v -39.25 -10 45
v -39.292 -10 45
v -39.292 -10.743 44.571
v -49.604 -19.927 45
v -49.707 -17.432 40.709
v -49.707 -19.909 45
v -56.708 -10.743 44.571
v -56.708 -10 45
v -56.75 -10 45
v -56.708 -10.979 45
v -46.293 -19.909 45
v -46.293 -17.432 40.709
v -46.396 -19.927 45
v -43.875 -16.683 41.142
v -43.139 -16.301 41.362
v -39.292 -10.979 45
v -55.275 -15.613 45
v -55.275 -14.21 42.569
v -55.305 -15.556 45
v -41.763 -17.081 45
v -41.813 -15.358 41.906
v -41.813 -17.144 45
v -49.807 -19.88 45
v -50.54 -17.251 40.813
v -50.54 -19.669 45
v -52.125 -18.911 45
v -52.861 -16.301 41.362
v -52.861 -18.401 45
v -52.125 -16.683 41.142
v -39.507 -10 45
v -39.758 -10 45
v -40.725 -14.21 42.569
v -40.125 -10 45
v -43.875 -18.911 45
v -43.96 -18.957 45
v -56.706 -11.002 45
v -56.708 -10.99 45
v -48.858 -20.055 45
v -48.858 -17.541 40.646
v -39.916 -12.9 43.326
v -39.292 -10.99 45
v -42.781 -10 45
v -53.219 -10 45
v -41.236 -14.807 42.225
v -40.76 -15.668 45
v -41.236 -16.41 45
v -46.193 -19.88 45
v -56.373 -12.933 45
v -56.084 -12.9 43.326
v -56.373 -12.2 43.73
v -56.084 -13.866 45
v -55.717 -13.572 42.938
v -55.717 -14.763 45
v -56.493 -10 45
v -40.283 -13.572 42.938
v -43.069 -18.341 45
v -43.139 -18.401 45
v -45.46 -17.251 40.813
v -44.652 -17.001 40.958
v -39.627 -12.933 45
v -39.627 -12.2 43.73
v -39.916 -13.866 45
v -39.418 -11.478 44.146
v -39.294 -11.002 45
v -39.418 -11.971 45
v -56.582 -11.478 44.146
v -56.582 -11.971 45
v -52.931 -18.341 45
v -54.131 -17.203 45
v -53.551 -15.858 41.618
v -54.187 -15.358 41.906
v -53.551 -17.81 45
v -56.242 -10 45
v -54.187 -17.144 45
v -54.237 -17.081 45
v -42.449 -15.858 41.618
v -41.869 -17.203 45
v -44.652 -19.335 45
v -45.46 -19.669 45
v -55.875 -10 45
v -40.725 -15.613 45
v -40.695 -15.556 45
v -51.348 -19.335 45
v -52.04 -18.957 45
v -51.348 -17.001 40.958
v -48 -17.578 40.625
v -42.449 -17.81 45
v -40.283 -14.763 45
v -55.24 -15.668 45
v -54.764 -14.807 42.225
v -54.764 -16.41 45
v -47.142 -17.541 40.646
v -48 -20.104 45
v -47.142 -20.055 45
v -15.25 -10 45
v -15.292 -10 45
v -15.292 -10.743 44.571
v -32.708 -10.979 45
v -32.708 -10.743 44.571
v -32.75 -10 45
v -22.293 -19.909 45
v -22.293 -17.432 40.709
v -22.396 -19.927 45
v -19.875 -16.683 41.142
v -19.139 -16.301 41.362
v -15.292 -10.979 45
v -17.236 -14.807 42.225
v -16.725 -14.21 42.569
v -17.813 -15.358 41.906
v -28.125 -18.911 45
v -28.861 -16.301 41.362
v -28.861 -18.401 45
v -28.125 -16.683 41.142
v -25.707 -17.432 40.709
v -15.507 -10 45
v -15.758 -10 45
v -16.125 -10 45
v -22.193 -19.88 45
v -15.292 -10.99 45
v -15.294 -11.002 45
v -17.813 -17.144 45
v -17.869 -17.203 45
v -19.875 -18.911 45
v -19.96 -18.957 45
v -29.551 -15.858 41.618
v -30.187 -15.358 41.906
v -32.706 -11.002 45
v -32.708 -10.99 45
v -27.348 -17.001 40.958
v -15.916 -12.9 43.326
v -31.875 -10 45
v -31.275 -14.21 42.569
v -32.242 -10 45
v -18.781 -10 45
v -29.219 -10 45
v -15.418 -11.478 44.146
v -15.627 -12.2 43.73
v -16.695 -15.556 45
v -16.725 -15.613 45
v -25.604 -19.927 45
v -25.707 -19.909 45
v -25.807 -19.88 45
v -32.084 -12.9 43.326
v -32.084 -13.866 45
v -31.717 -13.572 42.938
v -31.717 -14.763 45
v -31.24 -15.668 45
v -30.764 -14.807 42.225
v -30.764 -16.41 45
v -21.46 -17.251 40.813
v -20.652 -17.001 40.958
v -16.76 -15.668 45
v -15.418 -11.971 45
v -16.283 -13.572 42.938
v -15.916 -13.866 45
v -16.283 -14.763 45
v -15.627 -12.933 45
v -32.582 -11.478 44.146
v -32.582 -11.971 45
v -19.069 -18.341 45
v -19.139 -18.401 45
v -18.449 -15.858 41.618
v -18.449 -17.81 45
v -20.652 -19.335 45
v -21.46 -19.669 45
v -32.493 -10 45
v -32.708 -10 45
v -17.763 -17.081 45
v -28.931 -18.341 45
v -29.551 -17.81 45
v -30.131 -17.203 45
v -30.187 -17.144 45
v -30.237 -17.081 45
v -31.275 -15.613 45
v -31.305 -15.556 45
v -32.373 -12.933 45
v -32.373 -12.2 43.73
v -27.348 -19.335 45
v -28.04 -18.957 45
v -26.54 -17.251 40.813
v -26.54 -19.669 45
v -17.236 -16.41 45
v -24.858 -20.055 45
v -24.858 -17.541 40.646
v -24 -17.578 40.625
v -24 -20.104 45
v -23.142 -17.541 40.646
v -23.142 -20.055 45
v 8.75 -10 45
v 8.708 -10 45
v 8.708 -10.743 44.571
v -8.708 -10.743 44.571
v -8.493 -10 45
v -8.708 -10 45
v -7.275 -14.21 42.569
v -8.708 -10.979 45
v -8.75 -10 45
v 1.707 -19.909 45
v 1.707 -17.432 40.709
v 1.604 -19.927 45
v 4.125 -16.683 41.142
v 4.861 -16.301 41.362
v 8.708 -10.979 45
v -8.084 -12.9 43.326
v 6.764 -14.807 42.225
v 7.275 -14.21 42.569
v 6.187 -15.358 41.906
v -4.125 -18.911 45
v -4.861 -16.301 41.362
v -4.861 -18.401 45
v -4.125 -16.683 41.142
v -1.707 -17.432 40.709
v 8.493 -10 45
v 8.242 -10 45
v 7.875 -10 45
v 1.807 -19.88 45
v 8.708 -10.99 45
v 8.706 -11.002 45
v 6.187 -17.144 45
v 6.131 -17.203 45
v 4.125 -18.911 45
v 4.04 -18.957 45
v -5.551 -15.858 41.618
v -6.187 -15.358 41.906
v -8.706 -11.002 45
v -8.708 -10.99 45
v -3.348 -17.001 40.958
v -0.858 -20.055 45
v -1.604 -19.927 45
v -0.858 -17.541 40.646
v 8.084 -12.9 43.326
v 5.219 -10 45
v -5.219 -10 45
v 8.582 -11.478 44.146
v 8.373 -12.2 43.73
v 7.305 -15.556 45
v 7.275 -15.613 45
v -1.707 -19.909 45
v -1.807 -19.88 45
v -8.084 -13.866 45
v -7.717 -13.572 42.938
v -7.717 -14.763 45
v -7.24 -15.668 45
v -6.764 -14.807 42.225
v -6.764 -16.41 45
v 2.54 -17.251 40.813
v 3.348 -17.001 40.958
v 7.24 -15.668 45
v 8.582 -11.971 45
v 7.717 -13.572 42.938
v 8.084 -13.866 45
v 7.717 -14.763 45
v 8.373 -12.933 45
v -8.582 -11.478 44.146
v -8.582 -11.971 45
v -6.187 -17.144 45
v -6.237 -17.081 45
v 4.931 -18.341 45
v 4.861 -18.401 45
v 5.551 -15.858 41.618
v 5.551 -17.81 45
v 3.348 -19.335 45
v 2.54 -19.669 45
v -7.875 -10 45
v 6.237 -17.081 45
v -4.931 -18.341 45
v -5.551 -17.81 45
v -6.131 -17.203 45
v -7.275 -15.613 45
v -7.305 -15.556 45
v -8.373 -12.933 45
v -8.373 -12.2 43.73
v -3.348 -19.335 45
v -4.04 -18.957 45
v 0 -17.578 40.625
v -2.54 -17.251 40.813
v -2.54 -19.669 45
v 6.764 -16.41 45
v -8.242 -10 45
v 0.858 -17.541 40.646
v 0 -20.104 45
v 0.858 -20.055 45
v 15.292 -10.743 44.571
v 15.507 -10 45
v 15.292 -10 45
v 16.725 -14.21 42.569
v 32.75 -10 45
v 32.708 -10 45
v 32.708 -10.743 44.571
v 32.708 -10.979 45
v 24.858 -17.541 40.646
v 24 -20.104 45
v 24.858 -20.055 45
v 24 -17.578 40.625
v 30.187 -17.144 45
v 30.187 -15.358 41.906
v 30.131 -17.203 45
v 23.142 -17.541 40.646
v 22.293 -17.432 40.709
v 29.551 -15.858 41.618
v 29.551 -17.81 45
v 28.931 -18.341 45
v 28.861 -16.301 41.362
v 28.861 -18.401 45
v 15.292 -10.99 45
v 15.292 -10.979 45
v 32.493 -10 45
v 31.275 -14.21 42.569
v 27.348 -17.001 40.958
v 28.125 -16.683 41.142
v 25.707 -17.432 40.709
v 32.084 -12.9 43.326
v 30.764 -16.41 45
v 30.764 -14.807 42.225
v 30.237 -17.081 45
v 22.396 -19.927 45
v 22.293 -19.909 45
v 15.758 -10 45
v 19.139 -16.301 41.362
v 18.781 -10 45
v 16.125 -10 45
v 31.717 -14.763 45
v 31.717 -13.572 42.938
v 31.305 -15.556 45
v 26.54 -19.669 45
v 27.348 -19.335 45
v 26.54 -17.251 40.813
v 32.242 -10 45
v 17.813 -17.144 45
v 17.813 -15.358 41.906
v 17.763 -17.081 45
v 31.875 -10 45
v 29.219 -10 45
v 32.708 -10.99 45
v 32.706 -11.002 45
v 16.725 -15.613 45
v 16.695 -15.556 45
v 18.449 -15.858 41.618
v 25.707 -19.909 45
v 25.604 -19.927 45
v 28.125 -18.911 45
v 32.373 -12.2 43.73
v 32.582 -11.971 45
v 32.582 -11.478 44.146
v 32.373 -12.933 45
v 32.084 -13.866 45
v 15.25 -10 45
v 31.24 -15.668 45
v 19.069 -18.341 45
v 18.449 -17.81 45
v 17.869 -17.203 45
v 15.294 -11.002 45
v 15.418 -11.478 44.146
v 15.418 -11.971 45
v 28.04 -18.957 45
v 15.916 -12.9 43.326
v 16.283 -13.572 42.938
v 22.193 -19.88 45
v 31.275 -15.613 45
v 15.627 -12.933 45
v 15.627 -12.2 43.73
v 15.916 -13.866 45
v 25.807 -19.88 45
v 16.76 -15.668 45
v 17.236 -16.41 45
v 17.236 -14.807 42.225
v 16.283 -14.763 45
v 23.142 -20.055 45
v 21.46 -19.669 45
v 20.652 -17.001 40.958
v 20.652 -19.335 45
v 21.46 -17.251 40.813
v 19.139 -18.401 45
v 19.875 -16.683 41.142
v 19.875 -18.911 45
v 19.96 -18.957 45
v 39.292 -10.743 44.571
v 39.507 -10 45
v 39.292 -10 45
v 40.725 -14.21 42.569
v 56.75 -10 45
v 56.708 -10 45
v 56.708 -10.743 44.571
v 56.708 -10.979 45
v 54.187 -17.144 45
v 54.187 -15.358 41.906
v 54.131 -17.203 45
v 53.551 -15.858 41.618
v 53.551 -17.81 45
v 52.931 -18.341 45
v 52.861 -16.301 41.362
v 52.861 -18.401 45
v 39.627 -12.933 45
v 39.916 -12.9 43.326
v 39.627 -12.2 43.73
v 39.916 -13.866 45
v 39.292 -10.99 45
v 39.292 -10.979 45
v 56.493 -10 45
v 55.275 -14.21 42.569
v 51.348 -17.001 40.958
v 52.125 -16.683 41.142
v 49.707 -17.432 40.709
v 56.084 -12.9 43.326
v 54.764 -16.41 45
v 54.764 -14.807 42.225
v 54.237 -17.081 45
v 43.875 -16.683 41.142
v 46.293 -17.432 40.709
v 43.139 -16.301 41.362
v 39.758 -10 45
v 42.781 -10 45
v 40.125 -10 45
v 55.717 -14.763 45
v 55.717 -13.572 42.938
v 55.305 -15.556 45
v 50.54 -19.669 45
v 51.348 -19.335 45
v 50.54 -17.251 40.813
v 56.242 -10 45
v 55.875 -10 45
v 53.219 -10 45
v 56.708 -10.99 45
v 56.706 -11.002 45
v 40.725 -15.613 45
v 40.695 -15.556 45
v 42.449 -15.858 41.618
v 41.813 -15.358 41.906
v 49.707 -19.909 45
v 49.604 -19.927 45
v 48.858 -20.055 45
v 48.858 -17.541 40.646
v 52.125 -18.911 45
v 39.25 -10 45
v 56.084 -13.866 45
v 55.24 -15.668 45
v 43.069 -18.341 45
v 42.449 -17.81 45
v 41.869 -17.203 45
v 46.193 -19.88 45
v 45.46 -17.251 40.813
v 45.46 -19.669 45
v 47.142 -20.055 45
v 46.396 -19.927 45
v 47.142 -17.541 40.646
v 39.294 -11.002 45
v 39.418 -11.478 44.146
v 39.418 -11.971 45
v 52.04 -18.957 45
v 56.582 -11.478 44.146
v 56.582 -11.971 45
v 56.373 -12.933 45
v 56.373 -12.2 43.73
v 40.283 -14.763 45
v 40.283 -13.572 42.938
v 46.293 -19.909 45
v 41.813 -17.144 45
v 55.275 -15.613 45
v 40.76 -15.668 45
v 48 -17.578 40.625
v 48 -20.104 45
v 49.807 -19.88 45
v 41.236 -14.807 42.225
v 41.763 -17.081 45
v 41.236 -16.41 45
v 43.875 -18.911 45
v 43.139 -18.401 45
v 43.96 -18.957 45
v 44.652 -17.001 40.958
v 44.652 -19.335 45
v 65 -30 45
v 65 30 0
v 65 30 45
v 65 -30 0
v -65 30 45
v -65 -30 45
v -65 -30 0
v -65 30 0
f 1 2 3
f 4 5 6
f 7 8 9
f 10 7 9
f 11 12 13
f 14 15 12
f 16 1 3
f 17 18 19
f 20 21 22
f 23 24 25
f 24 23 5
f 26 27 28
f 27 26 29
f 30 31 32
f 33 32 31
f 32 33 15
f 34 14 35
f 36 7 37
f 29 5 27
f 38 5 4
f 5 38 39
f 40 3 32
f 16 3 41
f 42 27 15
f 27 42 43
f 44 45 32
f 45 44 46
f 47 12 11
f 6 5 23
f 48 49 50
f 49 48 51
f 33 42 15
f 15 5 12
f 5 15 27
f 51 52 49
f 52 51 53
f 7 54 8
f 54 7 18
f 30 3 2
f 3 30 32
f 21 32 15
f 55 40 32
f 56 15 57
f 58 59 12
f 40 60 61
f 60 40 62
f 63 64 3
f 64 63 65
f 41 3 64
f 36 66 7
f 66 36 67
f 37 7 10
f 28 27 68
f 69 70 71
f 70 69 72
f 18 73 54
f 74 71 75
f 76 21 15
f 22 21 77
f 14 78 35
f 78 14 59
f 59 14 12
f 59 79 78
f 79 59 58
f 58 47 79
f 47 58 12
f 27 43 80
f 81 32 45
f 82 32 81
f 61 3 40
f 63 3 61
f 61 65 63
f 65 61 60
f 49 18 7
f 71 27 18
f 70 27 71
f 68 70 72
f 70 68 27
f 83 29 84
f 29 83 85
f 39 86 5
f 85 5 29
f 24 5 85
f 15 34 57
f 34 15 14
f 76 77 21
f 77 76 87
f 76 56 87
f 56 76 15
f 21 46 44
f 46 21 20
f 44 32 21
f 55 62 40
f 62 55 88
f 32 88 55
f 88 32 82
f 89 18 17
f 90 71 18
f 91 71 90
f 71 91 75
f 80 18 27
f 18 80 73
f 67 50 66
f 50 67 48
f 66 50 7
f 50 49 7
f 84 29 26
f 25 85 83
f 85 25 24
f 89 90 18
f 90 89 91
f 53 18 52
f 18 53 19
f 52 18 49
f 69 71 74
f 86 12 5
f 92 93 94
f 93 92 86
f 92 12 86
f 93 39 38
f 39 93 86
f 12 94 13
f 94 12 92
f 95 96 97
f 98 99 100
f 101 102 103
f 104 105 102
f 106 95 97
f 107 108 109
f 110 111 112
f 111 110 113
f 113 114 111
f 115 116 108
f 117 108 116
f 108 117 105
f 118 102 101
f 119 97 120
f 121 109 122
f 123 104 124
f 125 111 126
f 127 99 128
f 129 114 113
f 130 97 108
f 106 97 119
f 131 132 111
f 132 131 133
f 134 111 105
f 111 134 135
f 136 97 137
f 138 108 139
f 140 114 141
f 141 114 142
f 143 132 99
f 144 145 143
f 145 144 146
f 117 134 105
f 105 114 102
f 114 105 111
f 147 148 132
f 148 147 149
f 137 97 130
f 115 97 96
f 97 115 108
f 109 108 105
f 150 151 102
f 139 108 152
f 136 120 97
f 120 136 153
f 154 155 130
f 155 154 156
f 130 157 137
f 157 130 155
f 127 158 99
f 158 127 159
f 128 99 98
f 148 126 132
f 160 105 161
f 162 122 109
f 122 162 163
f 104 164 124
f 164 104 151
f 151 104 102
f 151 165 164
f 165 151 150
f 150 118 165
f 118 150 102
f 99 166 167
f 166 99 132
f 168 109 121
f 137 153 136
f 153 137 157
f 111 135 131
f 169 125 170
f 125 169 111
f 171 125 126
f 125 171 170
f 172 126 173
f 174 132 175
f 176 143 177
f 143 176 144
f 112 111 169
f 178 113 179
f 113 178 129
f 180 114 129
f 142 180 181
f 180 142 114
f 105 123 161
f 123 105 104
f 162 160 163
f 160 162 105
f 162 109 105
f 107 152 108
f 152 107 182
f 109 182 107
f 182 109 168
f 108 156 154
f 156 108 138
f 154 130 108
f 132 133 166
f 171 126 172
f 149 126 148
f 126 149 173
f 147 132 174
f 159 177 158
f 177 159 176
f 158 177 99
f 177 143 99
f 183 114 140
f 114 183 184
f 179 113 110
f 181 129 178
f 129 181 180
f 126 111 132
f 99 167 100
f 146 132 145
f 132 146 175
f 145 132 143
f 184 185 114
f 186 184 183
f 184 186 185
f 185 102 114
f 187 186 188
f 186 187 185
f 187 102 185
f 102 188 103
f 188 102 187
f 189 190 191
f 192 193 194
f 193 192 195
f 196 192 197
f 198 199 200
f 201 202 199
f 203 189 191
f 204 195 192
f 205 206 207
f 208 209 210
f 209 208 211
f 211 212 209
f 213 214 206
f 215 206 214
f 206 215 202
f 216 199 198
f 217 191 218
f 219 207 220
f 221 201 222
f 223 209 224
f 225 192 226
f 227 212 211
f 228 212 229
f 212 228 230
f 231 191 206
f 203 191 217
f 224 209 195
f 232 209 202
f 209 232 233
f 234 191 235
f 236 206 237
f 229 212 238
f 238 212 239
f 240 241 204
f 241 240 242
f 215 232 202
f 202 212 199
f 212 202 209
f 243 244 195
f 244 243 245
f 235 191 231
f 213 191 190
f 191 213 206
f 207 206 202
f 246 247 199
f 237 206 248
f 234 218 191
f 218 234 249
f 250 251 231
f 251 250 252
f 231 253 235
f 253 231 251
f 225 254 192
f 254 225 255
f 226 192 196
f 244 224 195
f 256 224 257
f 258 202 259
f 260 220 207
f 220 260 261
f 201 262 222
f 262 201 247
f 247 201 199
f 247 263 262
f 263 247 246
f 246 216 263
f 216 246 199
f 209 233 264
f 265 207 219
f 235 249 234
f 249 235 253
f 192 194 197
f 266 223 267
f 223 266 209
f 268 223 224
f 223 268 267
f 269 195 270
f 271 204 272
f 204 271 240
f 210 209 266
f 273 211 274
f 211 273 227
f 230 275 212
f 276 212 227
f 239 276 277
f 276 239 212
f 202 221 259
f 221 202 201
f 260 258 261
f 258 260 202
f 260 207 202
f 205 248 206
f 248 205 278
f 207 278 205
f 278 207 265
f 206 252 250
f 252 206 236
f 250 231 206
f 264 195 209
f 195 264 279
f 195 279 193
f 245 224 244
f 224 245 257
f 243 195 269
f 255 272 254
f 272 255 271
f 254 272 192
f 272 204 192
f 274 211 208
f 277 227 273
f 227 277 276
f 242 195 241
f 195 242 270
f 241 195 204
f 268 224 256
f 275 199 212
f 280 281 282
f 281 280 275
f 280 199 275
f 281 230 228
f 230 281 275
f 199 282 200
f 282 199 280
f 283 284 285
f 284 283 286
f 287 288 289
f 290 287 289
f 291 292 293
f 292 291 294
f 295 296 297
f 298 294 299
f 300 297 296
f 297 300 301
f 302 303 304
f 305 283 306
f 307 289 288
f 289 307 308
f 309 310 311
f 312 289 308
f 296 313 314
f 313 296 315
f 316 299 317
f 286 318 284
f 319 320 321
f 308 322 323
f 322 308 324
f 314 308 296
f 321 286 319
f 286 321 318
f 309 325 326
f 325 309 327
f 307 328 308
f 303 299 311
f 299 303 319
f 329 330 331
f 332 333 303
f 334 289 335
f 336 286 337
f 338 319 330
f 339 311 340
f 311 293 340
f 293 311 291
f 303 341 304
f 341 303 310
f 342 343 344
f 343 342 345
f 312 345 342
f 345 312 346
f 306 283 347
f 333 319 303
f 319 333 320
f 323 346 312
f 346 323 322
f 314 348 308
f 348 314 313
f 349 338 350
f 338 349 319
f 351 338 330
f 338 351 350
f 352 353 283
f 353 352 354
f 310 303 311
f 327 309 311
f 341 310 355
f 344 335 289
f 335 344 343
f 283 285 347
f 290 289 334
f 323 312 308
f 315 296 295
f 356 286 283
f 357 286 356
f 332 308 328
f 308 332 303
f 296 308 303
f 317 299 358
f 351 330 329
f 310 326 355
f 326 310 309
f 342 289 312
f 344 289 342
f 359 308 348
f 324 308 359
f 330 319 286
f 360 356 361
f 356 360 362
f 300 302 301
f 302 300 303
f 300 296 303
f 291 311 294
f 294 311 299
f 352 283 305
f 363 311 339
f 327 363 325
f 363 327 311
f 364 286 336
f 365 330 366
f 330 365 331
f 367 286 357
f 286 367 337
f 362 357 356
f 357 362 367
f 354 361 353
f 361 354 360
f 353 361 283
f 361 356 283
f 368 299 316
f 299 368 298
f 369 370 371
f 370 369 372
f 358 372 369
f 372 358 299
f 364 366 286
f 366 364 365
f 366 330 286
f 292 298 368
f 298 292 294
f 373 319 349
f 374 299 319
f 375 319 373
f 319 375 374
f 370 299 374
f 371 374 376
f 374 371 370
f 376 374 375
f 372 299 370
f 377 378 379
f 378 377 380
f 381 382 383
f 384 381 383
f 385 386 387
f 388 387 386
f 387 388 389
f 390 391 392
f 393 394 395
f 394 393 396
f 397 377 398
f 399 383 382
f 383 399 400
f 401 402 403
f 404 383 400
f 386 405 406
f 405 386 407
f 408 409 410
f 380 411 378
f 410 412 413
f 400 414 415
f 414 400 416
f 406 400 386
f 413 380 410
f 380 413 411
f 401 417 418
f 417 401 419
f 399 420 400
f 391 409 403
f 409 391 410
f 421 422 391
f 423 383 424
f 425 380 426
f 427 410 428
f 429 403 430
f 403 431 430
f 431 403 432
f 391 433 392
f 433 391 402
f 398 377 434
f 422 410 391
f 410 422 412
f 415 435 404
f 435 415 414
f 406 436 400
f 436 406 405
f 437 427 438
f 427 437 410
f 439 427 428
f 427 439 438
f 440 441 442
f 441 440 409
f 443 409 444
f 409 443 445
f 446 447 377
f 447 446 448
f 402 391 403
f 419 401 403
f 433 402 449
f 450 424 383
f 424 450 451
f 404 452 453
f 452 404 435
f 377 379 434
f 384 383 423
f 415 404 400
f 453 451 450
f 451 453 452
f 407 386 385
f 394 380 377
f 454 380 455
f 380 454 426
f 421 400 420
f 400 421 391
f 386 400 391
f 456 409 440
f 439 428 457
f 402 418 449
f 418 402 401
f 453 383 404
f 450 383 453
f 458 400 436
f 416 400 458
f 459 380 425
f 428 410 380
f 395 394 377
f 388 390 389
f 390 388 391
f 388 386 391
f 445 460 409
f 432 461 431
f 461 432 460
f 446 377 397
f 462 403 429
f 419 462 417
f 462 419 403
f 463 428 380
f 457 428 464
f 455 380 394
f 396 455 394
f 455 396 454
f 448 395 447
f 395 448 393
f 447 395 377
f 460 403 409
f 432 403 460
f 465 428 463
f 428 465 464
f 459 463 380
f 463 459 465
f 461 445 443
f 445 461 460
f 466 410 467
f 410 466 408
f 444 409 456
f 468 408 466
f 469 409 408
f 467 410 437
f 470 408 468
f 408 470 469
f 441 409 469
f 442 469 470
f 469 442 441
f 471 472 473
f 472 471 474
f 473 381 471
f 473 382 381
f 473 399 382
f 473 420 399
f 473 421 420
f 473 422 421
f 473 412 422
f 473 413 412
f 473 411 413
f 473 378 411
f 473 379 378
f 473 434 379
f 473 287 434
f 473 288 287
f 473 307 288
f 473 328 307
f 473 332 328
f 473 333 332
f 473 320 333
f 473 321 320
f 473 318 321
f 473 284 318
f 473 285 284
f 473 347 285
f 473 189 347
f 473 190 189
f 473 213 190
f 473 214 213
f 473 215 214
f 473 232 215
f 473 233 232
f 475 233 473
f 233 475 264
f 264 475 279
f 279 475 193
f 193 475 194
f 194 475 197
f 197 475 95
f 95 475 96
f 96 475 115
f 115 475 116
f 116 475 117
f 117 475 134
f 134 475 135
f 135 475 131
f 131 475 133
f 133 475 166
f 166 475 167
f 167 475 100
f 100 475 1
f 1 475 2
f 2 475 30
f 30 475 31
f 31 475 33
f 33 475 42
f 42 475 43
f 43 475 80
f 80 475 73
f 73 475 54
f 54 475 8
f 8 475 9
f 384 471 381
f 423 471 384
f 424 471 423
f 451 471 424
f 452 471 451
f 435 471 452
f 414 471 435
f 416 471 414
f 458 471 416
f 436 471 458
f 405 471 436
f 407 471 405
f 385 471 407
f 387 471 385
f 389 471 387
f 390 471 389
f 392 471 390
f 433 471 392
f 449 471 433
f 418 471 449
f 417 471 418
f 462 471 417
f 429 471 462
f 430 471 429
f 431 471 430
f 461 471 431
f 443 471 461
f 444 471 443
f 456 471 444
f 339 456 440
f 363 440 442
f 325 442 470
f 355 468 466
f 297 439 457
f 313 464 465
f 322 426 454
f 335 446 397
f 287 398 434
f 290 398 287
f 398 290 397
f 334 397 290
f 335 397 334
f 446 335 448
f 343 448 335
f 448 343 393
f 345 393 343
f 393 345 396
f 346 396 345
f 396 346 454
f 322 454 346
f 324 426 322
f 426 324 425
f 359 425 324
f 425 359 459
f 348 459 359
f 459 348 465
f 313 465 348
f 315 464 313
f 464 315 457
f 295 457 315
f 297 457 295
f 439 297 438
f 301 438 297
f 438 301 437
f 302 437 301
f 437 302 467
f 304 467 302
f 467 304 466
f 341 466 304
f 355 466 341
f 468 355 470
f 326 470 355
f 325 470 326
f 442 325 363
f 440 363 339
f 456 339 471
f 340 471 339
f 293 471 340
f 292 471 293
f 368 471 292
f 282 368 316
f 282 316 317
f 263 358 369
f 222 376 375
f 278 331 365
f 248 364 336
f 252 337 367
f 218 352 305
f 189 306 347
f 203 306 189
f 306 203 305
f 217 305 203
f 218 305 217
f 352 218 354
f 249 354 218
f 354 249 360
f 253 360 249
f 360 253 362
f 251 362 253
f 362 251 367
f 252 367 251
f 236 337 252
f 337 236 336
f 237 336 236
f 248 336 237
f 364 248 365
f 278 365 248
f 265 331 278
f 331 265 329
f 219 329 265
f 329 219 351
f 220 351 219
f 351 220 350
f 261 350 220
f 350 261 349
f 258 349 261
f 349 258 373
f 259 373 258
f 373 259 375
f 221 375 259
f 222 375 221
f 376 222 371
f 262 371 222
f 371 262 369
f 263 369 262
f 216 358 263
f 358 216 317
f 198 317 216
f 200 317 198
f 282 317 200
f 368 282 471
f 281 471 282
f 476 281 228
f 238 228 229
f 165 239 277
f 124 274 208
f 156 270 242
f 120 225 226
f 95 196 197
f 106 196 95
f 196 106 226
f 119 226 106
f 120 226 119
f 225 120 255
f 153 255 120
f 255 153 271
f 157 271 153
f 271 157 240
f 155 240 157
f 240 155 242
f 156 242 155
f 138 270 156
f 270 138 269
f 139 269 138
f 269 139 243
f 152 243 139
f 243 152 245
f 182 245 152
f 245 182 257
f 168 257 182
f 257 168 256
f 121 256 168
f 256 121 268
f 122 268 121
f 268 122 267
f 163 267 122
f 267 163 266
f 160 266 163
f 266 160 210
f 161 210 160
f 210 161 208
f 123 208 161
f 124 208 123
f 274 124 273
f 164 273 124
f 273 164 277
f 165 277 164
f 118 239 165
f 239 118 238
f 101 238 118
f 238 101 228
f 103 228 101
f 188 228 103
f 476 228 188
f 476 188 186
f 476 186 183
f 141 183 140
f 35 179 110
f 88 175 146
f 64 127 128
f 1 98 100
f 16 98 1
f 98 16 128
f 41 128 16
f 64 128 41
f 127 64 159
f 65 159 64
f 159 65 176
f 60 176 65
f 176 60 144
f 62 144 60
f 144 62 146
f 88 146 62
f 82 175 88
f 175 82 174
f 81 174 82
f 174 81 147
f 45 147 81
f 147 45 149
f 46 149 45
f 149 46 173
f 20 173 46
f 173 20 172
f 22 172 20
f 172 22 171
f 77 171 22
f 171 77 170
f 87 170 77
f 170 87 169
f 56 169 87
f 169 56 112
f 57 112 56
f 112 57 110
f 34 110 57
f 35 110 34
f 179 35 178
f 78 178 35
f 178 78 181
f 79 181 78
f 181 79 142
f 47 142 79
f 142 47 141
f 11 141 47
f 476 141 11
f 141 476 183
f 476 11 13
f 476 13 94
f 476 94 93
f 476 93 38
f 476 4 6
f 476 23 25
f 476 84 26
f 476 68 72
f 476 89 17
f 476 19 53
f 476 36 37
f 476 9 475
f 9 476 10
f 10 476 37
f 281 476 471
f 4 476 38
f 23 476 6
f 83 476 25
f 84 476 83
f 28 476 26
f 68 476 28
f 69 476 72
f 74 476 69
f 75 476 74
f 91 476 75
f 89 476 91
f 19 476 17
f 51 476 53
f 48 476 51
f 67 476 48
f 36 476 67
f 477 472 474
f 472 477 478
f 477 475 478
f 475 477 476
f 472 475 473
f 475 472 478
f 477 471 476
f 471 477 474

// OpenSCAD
// 15mL Conical Tube Rack
// Designed for easy volume reading and supernatant removal.

// --- Dimensions ---
L = 130;            // Length along X (mm)
W = 60;             // Depth along Y (mm)
H = 45;             // Height along Z (mm)

num_holes = 5;      // Number of tube holes
spacing = 24;       // Spacing between hole centers along X (mm)

hole_d = 17.5;      // Diameter of the holes (mm)
hole_depth = 40;    // Depth of the holes (mm)
tilt_angle = 30;    // Tilt angle from vertical (degrees)

// --- Parameters ---
$fn = 64;

// Calculate the starting X position to center the holes
// The holes are centered on the block, so the middle hole is at X=0.
// The offset for the first hole is -( (num_holes - 1) / 2 ) * spacing
hole_x_start = -(num_holes - 1) / 2 * spacing;

// The user specified: "Each axis meets the top face at y = -10"
// In OpenSCAD, the top face is at Z = H. 
// However, the user used Y for depth and Z for height. 
// I will follow the user's coordinate system: X=Length, Y=Depth, Z=Height.
// "Each axis meets the top face at y = -10" implies the hole is offset 
// from the center of the Y-axis.
y_offset = -10; 

// --- Modeling ---

// The block is centered on X and Y, sitting on Z=0.
// To center a block of [L, W, H] on X and Y:
// translate([-L/2, -W/2, 0]) cube([L, W, H]);

difference() {
    // The main block
    translate([-L/2, -W/2, 0])
        cube([L, W, H]);

    // The five blind holes
    for (i = [0 : num_holes - 1]) {
        let (
            current_x = hole_x_start + (i * spacing),
            current_y = y_offset,
            current_z = H // Start at the top face
        )
        // We use a rotation to tilt the cylinder.
        // The axis is tilted 30 degrees from vertical (Z) in the YZ plane.
        // "going down into the block, it moves toward +Y"
        // This means the rotation is around the X axis.
        // A positive rotation around X moves +Y as Z decreases.
        // However, standard rotation: rotate([30, 0, 0]) tilts the Z axis towards Y.
        
        translate([current_x, current_y, current_z])
        rotate([tilt_angle, 0, 0])
        // To make it a "blind hole" with a flat end, we translate the cylinder 
        // so its top is at the surface and it extends downwards.
        // Since we rotate around the top point, the cylinder extends "down and forward".
        // We must extend the cylinder length to ensure it cuts through the top face.
        translate([0, 0, 0]) 
        cylinder(h = hole_depth + 1, d = hole_d);
    }
}

// Note on the tilt: 
// The user requested: "Each axis meets the top face at y = -10 and is tilted 30 degrees from vertical in the YZ plane: going down into the block, it moves toward +Y."
// In a standard coordinate system where Z is up:
// A rotation of 30 degrees around the X axis:
// New Y = Y_old * cos(30) + Z_old * sin(30)
// New Z = -Y_old * sin(30) + Z_old * cos(30)
// If we rotate the Z-axis vector [0,0,1] by 30 deg around X, we get [0, sin(30), cos(30)].
// This moves the axis toward +Y as it goes down.
